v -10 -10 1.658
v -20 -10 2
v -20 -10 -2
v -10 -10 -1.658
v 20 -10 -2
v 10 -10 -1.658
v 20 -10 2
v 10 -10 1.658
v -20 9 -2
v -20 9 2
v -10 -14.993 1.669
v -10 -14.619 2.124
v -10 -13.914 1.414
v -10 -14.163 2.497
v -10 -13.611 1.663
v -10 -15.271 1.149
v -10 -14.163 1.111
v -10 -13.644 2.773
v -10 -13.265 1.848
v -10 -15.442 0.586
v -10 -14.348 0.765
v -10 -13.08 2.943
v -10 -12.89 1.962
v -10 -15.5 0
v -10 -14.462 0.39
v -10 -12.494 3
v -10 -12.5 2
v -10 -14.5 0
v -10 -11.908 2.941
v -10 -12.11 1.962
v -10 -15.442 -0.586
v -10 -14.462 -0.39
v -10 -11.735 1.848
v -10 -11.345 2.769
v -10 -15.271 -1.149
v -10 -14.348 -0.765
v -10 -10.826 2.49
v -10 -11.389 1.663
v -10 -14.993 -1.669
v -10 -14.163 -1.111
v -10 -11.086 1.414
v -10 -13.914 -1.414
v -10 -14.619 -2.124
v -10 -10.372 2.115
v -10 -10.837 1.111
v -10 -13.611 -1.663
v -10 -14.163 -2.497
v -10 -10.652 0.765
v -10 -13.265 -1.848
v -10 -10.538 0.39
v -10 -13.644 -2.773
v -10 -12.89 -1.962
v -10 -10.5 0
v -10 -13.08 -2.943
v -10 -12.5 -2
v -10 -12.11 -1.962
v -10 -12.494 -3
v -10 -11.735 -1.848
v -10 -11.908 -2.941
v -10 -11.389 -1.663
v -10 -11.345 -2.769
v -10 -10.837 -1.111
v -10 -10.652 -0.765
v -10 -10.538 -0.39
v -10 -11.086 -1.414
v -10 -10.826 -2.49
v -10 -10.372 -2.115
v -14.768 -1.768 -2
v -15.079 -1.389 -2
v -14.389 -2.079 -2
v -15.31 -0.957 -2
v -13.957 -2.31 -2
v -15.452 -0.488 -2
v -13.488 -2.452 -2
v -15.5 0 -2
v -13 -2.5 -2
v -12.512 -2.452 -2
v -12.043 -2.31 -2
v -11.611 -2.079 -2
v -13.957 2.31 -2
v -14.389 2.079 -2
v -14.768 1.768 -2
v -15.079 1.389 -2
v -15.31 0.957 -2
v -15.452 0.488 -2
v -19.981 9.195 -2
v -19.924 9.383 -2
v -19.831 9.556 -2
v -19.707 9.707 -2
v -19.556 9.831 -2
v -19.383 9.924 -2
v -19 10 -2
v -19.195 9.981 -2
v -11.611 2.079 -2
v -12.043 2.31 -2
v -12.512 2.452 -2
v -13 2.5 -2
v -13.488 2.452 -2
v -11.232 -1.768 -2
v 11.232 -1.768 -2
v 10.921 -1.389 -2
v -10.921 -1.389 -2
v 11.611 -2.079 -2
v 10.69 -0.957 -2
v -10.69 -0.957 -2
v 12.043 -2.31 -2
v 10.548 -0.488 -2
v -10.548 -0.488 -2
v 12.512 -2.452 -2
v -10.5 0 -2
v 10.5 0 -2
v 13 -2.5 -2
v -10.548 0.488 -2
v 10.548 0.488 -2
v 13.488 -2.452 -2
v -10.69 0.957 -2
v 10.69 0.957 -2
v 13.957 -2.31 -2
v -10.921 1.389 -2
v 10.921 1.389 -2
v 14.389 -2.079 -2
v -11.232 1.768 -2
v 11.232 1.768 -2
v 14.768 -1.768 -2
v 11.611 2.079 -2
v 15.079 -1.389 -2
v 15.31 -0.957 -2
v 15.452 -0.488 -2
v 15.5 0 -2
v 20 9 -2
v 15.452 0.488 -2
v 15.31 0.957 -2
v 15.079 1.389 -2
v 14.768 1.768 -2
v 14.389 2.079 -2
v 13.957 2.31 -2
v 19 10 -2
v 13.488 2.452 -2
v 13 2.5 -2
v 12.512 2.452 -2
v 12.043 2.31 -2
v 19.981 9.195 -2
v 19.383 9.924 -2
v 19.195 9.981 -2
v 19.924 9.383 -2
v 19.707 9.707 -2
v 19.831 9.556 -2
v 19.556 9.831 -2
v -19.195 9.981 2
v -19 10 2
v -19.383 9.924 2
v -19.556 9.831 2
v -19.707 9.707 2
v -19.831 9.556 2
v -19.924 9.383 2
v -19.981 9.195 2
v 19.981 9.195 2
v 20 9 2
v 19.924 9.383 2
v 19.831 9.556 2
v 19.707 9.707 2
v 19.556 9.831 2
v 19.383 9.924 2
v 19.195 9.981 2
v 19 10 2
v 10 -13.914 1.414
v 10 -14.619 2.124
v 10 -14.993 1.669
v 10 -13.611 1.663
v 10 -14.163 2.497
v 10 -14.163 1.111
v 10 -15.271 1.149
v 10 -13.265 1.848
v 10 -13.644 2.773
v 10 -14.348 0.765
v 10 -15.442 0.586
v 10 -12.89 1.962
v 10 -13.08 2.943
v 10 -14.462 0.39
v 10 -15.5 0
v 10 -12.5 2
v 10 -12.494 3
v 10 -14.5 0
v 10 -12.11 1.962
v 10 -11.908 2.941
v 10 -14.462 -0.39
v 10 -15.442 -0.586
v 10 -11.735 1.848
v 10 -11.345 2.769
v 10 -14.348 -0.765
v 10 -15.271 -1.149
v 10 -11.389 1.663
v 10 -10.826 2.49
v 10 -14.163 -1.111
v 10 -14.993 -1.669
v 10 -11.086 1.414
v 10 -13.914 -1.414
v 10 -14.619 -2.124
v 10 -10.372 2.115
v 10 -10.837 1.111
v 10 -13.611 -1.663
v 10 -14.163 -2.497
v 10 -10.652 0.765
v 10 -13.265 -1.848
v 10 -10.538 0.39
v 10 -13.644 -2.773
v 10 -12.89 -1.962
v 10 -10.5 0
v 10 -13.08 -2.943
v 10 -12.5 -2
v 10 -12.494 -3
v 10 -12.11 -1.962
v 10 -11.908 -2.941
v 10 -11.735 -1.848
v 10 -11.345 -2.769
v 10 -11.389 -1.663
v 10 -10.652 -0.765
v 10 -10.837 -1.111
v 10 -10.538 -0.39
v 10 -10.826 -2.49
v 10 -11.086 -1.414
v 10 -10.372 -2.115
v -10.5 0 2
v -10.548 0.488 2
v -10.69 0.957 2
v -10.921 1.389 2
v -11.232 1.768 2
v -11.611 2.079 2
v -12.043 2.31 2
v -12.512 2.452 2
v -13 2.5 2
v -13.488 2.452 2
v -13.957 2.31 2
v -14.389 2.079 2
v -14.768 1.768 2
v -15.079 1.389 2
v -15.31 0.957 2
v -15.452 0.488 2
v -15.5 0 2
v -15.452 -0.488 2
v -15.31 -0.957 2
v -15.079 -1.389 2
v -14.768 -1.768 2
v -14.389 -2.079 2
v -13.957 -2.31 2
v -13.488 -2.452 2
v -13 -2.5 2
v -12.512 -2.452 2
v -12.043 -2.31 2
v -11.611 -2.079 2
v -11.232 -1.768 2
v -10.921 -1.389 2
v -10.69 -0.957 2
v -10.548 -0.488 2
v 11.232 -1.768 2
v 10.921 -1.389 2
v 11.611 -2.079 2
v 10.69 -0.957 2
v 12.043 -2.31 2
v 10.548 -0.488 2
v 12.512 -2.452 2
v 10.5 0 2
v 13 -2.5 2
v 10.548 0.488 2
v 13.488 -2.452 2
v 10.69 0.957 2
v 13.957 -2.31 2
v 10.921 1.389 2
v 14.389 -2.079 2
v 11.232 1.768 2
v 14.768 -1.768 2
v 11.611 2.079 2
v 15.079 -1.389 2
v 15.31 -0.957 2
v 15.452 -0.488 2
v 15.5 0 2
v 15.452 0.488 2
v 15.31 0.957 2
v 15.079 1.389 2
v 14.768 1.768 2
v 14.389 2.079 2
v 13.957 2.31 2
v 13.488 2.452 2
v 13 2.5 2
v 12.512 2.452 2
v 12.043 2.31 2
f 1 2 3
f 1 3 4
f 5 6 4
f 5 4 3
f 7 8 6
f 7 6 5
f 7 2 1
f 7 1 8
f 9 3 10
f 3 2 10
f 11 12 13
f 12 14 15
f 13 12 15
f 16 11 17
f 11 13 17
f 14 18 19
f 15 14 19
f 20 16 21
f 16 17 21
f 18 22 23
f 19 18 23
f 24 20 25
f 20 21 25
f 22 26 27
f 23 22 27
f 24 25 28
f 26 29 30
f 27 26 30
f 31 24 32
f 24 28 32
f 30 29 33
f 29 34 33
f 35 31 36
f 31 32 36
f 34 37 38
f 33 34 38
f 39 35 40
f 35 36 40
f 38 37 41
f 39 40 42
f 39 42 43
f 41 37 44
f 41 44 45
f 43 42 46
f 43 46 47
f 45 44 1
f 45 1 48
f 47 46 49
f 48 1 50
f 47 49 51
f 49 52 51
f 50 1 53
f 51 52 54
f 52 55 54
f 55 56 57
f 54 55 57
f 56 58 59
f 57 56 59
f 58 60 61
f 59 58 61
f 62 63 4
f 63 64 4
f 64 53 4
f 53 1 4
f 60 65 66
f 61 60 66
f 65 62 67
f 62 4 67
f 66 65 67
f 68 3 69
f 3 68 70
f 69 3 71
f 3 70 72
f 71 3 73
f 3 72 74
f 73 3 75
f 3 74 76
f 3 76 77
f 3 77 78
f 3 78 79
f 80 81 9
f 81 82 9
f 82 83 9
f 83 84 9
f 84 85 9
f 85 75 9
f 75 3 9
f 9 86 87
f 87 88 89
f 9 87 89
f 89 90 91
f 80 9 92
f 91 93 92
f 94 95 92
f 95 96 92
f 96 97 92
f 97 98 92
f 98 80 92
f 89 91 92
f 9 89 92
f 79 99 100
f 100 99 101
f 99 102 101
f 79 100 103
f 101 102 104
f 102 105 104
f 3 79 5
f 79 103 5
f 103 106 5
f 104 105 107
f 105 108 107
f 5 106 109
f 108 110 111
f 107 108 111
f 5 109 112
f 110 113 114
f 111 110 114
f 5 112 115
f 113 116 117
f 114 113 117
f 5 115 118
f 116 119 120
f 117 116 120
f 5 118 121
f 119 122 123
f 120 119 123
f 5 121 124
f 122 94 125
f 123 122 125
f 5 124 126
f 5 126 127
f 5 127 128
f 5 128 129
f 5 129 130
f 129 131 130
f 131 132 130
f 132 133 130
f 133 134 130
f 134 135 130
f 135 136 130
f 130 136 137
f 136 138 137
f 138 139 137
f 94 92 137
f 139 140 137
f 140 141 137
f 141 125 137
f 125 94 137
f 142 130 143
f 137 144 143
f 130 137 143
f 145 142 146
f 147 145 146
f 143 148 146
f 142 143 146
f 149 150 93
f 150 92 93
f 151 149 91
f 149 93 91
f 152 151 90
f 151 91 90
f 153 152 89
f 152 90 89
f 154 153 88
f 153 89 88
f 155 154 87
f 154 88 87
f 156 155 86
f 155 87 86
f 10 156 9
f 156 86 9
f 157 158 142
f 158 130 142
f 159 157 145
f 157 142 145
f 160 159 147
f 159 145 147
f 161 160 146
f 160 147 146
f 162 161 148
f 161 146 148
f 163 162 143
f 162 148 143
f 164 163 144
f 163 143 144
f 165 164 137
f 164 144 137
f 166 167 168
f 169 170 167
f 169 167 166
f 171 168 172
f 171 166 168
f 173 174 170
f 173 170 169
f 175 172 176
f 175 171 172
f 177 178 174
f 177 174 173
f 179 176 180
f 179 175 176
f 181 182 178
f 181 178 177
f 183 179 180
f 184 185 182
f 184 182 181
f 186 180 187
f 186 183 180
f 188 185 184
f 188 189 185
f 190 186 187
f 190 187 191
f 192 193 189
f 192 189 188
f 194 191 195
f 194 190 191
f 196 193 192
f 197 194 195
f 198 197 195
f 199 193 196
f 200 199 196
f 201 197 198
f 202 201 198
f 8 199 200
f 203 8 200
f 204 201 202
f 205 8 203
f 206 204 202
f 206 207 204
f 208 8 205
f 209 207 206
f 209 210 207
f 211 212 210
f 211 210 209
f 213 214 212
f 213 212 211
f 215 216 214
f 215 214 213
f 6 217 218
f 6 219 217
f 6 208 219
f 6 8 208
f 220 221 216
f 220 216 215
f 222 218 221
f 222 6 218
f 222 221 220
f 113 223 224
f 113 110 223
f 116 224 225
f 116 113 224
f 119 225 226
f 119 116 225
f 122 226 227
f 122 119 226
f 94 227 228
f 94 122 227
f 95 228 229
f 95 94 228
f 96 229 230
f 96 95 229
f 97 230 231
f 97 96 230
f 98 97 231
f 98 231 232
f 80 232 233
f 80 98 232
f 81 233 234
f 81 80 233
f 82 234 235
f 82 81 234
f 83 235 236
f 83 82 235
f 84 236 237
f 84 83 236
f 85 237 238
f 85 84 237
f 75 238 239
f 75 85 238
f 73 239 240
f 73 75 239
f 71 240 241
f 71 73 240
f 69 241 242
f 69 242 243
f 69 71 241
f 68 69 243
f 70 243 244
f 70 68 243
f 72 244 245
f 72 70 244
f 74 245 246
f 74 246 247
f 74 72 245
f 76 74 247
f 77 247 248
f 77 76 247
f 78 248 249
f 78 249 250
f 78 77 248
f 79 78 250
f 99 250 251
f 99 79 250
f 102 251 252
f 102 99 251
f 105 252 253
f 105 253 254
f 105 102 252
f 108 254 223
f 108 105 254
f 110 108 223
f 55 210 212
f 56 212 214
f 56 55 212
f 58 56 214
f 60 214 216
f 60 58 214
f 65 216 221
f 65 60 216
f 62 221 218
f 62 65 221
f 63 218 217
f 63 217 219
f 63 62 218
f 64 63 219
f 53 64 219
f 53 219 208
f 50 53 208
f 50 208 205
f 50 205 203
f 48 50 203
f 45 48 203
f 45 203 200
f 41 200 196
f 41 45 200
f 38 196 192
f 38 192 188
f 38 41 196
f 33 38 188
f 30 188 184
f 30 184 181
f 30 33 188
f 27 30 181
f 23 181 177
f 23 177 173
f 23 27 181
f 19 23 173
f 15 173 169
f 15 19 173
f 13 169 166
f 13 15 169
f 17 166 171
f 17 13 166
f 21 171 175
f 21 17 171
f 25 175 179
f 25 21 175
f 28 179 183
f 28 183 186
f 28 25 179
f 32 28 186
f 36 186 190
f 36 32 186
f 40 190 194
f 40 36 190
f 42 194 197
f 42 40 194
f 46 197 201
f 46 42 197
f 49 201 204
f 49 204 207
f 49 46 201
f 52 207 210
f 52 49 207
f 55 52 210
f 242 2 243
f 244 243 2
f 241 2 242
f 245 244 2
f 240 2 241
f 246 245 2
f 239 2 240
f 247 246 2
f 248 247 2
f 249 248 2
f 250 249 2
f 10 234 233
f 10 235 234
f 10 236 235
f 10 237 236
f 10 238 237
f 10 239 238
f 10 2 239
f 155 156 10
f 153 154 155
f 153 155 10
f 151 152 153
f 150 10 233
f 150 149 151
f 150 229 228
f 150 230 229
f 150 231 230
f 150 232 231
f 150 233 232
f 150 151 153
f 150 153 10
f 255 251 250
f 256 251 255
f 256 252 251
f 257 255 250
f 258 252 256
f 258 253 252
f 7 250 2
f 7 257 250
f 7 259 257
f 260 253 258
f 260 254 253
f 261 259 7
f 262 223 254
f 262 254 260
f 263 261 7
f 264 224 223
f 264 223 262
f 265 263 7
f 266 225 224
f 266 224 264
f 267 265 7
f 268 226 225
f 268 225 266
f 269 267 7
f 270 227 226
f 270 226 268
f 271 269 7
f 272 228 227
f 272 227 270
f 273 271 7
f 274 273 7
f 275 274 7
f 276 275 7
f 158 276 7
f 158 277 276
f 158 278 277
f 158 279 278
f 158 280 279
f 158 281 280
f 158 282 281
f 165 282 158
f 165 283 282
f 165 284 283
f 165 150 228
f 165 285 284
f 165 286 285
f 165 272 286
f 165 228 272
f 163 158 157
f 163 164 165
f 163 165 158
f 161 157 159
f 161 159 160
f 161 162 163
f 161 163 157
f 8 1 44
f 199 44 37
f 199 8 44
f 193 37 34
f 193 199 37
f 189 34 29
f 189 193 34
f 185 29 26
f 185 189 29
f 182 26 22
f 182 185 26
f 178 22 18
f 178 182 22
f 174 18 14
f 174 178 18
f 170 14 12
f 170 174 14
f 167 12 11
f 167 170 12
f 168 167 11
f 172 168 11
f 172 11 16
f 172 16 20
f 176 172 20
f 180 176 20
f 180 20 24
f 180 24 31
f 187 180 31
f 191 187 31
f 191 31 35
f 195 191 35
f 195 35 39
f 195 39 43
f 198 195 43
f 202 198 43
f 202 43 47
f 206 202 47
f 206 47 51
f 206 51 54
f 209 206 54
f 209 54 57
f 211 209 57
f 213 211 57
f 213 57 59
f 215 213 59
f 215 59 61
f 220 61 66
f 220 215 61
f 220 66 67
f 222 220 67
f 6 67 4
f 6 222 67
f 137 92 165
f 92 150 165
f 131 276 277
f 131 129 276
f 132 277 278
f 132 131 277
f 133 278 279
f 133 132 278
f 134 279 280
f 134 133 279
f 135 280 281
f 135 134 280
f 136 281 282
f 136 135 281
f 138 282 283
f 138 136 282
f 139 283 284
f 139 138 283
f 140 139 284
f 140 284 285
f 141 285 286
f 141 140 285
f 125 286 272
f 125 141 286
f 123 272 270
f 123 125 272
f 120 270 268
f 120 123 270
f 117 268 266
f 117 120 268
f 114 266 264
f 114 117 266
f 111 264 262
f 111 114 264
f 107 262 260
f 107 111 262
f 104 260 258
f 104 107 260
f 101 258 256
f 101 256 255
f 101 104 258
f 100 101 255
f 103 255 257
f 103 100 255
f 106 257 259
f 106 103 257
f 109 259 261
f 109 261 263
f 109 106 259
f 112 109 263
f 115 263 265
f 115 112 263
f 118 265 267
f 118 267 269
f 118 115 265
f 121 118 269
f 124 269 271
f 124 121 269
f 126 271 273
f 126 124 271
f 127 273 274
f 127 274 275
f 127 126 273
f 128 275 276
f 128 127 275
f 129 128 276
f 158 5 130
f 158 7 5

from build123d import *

# Parameters (mm, degrees)
SKETCH2_W           = 40
SKETCH2_H           = 20
SKETCH2_R           = 2.5
BOSS_EXTRUDE2_DEPTH = 2
SKETCH5_R           = 3
SKETCH5_R_2         = 2
BOSS_EXTRUDE3_DEPTH = 10
FILLET1_R           = 1


with BuildPart() as part:
    # Sketch2 → Boss-Extrude2 (new body, symmetric)
    with BuildSketch(Plane.XY):
        Rectangle(SKETCH2_W, SKETCH2_H)
        with Locations((-13, 0)):
            Circle(SKETCH2_R, mode=Mode.SUBTRACT)
        with Locations((13, 0)):
            Circle(SKETCH2_R, mode=Mode.SUBTRACT)
    extrude(amount=BOSS_EXTRUDE2_DEPTH, both=True)

    # Sketch5 → Boss-Extrude3 (add, symmetric)
    with BuildSketch(Plane(origin=(0, 0, 0), x_dir=(0, 0, -1), z_dir=(1, 0, 0))):
        with Locations((0, -12.5)):
            Circle(SKETCH5_R)
        with Locations((0, -12.5)):
            Circle(SKETCH5_R_2, mode=Mode.SUBTRACT)
    extrude(amount=BOSS_EXTRUDE3_DEPTH, both=True)

    # Fillet1
    fillet1_edges = [part.edges().sort_by_distance(p)[0] for p in [
        (-20, 10, 0),
        (20, 10, 0),
    ]]
    fillet(fillet1_edges, radius=FILLET1_R)


solid = part.part
